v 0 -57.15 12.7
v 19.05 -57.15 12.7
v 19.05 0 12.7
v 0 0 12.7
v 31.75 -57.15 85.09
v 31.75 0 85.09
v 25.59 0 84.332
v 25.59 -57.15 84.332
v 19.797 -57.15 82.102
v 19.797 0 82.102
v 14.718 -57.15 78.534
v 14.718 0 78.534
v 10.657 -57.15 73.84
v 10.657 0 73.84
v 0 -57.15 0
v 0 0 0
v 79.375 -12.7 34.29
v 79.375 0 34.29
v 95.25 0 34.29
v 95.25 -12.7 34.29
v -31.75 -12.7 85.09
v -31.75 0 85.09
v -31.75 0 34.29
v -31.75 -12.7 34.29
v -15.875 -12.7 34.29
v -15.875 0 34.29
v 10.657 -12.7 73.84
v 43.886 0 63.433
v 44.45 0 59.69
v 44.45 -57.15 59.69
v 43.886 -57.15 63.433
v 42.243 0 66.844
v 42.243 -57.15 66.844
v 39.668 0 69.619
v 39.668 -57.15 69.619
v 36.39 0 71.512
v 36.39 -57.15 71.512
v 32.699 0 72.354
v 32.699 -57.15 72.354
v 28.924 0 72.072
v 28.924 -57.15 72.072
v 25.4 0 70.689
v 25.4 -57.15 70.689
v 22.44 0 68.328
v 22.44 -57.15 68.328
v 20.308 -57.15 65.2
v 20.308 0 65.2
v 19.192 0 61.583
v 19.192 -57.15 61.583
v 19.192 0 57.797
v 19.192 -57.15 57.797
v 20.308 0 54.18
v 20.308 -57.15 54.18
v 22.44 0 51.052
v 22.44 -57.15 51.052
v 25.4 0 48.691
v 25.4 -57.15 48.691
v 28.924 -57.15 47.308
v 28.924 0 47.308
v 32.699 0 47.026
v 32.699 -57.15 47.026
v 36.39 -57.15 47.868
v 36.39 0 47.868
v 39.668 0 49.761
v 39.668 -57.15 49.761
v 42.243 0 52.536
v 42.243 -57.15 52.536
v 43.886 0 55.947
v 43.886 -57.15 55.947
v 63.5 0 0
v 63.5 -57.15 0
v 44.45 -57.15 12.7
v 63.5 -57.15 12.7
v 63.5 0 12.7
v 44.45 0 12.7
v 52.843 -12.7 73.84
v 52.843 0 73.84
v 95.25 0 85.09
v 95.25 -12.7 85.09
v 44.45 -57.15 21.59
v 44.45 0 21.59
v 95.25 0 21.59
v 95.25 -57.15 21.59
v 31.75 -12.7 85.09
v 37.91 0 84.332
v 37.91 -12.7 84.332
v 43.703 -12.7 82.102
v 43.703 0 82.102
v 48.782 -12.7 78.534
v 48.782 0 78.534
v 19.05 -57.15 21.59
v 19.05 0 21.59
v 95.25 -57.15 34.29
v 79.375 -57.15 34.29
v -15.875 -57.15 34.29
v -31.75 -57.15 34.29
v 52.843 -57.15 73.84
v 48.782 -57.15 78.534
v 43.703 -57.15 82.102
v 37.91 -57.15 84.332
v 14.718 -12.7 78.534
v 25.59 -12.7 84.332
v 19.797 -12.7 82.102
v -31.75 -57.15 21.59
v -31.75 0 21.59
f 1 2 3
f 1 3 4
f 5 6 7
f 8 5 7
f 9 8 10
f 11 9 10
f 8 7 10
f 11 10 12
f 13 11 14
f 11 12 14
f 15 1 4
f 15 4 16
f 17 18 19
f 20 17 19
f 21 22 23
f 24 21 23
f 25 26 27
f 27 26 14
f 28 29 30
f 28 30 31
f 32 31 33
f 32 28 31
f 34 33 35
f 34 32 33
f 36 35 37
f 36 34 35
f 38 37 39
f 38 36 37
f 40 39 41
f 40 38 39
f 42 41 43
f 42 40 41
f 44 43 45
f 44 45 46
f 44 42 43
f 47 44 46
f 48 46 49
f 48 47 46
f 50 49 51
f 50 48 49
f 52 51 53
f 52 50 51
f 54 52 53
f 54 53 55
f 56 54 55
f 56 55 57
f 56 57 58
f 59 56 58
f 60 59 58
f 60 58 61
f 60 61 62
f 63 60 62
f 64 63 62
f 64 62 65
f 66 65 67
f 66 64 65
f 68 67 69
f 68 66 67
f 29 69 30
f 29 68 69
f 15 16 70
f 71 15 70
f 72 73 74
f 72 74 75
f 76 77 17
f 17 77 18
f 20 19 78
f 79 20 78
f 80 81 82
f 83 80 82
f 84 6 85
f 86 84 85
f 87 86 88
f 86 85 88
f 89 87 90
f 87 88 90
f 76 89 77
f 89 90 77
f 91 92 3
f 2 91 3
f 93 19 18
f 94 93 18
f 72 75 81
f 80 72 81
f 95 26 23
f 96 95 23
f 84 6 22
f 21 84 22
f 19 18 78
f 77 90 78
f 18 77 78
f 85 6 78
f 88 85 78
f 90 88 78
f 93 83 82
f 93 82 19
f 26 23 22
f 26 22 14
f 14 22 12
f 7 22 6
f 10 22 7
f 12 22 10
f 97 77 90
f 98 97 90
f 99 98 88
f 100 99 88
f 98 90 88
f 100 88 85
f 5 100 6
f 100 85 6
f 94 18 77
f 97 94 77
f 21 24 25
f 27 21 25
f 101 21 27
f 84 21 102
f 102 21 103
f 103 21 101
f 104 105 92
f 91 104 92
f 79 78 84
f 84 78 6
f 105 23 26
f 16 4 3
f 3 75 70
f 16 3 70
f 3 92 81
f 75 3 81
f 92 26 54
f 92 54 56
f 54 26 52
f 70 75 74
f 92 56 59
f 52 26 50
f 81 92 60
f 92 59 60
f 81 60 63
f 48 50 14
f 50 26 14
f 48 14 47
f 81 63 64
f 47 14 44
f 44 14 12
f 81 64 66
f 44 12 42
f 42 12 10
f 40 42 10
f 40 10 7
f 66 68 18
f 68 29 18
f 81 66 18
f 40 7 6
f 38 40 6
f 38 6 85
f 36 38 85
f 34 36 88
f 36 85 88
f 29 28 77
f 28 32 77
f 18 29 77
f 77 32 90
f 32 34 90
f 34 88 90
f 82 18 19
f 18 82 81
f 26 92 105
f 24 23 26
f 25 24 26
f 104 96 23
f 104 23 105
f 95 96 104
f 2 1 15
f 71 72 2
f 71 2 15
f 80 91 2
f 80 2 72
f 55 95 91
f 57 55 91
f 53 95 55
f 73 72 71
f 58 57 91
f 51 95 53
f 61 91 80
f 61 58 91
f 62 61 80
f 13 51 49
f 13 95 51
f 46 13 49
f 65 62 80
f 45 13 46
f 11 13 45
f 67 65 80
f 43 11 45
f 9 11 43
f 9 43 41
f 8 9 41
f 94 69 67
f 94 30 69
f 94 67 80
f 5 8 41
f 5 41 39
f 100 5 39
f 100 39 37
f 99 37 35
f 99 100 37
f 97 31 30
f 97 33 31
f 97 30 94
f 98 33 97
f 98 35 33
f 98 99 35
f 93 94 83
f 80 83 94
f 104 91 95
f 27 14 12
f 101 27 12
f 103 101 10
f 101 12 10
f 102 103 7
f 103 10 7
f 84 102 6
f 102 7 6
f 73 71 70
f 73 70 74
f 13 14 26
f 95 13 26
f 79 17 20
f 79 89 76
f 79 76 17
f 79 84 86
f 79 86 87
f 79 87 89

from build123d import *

# Parameters (mm, degrees)
F1_DEPTH = 12.7
F0_R     = 12.7
F2_DEPTH = 57.15


with BuildPart() as f1:
    # F0 (on Front) → F1 (new body)
    with BuildSketch(Plane.XZ):
        with BuildLine():
            Line((-31.75, 85.09), (-31.75, 34.29))
            Line((-31.75, 34.29), (-15.875, 34.29))
            Line((-15.875, 34.29), (10.656574, 73.840173))
            ThreePointArc((10.656574, 73.840173), (19.797059, 82.101765), (31.75, 85.09))
            Line((31.75, 85.09), (-31.75, 85.09))
        make_face()
        with BuildLine():
            Line((79.375, 34.29), (95.25, 34.29))
            Line((95.25, 34.29), (95.25, 85.09))
            Line((95.25, 85.09), (31.75, 85.09))
            ThreePointArc((31.75, 85.09), (43.702941, 82.101765), (52.843426, 73.840173))
            Line((52.843426, 73.840173), (79.375, 34.29))
        make_face()
    extrude(amount=F1_DEPTH)


with BuildPart() as f2:
    # F0 (on Front) → F2 (new body)
    with BuildSketch(Plane.XZ):
        with BuildLine():
            Line((0, 12.7), (0, 0))
            Line((0, 0), (63.5, 0))
            Line((63.5, 0), (63.5, 12.7))
            Line((63.5, 12.7), (44.45, 12.7))
            Line((44.45, 12.7), (44.45, 21.59))
            Line((44.45, 21.59), (95.25, 21.59))
            Line((95.25, 21.59), (95.25, 34.29))
            Line((95.25, 34.29), (79.375, 34.29))
            Line((79.375, 34.29), (52.843426, 73.840173))
            ThreePointArc((52.843426, 73.840173), (43.702941, 82.101765), (31.75, 85.09))
            ThreePointArc((31.75, 85.09), (19.797059, 82.101765), (10.656574, 73.840173))
            Line((10.656574, 73.840173), (-15.875, 34.29))
            Line((-15.875, 34.29), (-31.75, 34.29))
            Line((-31.75, 34.29), (-31.75, 21.59))
            Line((-31.75, 21.59), (19.05, 21.59))
            Line((19.05, 21.59), (19.05, 12.7))
            Line((19.05, 12.7), (0, 12.7))
        make_face()
        with Locations((31.75, 59.69)):
            Circle(F0_R, mode=Mode.SUBTRACT)
    extrude(amount=F2_DEPTH)


solid = Compound([f1.part, f2.part])
